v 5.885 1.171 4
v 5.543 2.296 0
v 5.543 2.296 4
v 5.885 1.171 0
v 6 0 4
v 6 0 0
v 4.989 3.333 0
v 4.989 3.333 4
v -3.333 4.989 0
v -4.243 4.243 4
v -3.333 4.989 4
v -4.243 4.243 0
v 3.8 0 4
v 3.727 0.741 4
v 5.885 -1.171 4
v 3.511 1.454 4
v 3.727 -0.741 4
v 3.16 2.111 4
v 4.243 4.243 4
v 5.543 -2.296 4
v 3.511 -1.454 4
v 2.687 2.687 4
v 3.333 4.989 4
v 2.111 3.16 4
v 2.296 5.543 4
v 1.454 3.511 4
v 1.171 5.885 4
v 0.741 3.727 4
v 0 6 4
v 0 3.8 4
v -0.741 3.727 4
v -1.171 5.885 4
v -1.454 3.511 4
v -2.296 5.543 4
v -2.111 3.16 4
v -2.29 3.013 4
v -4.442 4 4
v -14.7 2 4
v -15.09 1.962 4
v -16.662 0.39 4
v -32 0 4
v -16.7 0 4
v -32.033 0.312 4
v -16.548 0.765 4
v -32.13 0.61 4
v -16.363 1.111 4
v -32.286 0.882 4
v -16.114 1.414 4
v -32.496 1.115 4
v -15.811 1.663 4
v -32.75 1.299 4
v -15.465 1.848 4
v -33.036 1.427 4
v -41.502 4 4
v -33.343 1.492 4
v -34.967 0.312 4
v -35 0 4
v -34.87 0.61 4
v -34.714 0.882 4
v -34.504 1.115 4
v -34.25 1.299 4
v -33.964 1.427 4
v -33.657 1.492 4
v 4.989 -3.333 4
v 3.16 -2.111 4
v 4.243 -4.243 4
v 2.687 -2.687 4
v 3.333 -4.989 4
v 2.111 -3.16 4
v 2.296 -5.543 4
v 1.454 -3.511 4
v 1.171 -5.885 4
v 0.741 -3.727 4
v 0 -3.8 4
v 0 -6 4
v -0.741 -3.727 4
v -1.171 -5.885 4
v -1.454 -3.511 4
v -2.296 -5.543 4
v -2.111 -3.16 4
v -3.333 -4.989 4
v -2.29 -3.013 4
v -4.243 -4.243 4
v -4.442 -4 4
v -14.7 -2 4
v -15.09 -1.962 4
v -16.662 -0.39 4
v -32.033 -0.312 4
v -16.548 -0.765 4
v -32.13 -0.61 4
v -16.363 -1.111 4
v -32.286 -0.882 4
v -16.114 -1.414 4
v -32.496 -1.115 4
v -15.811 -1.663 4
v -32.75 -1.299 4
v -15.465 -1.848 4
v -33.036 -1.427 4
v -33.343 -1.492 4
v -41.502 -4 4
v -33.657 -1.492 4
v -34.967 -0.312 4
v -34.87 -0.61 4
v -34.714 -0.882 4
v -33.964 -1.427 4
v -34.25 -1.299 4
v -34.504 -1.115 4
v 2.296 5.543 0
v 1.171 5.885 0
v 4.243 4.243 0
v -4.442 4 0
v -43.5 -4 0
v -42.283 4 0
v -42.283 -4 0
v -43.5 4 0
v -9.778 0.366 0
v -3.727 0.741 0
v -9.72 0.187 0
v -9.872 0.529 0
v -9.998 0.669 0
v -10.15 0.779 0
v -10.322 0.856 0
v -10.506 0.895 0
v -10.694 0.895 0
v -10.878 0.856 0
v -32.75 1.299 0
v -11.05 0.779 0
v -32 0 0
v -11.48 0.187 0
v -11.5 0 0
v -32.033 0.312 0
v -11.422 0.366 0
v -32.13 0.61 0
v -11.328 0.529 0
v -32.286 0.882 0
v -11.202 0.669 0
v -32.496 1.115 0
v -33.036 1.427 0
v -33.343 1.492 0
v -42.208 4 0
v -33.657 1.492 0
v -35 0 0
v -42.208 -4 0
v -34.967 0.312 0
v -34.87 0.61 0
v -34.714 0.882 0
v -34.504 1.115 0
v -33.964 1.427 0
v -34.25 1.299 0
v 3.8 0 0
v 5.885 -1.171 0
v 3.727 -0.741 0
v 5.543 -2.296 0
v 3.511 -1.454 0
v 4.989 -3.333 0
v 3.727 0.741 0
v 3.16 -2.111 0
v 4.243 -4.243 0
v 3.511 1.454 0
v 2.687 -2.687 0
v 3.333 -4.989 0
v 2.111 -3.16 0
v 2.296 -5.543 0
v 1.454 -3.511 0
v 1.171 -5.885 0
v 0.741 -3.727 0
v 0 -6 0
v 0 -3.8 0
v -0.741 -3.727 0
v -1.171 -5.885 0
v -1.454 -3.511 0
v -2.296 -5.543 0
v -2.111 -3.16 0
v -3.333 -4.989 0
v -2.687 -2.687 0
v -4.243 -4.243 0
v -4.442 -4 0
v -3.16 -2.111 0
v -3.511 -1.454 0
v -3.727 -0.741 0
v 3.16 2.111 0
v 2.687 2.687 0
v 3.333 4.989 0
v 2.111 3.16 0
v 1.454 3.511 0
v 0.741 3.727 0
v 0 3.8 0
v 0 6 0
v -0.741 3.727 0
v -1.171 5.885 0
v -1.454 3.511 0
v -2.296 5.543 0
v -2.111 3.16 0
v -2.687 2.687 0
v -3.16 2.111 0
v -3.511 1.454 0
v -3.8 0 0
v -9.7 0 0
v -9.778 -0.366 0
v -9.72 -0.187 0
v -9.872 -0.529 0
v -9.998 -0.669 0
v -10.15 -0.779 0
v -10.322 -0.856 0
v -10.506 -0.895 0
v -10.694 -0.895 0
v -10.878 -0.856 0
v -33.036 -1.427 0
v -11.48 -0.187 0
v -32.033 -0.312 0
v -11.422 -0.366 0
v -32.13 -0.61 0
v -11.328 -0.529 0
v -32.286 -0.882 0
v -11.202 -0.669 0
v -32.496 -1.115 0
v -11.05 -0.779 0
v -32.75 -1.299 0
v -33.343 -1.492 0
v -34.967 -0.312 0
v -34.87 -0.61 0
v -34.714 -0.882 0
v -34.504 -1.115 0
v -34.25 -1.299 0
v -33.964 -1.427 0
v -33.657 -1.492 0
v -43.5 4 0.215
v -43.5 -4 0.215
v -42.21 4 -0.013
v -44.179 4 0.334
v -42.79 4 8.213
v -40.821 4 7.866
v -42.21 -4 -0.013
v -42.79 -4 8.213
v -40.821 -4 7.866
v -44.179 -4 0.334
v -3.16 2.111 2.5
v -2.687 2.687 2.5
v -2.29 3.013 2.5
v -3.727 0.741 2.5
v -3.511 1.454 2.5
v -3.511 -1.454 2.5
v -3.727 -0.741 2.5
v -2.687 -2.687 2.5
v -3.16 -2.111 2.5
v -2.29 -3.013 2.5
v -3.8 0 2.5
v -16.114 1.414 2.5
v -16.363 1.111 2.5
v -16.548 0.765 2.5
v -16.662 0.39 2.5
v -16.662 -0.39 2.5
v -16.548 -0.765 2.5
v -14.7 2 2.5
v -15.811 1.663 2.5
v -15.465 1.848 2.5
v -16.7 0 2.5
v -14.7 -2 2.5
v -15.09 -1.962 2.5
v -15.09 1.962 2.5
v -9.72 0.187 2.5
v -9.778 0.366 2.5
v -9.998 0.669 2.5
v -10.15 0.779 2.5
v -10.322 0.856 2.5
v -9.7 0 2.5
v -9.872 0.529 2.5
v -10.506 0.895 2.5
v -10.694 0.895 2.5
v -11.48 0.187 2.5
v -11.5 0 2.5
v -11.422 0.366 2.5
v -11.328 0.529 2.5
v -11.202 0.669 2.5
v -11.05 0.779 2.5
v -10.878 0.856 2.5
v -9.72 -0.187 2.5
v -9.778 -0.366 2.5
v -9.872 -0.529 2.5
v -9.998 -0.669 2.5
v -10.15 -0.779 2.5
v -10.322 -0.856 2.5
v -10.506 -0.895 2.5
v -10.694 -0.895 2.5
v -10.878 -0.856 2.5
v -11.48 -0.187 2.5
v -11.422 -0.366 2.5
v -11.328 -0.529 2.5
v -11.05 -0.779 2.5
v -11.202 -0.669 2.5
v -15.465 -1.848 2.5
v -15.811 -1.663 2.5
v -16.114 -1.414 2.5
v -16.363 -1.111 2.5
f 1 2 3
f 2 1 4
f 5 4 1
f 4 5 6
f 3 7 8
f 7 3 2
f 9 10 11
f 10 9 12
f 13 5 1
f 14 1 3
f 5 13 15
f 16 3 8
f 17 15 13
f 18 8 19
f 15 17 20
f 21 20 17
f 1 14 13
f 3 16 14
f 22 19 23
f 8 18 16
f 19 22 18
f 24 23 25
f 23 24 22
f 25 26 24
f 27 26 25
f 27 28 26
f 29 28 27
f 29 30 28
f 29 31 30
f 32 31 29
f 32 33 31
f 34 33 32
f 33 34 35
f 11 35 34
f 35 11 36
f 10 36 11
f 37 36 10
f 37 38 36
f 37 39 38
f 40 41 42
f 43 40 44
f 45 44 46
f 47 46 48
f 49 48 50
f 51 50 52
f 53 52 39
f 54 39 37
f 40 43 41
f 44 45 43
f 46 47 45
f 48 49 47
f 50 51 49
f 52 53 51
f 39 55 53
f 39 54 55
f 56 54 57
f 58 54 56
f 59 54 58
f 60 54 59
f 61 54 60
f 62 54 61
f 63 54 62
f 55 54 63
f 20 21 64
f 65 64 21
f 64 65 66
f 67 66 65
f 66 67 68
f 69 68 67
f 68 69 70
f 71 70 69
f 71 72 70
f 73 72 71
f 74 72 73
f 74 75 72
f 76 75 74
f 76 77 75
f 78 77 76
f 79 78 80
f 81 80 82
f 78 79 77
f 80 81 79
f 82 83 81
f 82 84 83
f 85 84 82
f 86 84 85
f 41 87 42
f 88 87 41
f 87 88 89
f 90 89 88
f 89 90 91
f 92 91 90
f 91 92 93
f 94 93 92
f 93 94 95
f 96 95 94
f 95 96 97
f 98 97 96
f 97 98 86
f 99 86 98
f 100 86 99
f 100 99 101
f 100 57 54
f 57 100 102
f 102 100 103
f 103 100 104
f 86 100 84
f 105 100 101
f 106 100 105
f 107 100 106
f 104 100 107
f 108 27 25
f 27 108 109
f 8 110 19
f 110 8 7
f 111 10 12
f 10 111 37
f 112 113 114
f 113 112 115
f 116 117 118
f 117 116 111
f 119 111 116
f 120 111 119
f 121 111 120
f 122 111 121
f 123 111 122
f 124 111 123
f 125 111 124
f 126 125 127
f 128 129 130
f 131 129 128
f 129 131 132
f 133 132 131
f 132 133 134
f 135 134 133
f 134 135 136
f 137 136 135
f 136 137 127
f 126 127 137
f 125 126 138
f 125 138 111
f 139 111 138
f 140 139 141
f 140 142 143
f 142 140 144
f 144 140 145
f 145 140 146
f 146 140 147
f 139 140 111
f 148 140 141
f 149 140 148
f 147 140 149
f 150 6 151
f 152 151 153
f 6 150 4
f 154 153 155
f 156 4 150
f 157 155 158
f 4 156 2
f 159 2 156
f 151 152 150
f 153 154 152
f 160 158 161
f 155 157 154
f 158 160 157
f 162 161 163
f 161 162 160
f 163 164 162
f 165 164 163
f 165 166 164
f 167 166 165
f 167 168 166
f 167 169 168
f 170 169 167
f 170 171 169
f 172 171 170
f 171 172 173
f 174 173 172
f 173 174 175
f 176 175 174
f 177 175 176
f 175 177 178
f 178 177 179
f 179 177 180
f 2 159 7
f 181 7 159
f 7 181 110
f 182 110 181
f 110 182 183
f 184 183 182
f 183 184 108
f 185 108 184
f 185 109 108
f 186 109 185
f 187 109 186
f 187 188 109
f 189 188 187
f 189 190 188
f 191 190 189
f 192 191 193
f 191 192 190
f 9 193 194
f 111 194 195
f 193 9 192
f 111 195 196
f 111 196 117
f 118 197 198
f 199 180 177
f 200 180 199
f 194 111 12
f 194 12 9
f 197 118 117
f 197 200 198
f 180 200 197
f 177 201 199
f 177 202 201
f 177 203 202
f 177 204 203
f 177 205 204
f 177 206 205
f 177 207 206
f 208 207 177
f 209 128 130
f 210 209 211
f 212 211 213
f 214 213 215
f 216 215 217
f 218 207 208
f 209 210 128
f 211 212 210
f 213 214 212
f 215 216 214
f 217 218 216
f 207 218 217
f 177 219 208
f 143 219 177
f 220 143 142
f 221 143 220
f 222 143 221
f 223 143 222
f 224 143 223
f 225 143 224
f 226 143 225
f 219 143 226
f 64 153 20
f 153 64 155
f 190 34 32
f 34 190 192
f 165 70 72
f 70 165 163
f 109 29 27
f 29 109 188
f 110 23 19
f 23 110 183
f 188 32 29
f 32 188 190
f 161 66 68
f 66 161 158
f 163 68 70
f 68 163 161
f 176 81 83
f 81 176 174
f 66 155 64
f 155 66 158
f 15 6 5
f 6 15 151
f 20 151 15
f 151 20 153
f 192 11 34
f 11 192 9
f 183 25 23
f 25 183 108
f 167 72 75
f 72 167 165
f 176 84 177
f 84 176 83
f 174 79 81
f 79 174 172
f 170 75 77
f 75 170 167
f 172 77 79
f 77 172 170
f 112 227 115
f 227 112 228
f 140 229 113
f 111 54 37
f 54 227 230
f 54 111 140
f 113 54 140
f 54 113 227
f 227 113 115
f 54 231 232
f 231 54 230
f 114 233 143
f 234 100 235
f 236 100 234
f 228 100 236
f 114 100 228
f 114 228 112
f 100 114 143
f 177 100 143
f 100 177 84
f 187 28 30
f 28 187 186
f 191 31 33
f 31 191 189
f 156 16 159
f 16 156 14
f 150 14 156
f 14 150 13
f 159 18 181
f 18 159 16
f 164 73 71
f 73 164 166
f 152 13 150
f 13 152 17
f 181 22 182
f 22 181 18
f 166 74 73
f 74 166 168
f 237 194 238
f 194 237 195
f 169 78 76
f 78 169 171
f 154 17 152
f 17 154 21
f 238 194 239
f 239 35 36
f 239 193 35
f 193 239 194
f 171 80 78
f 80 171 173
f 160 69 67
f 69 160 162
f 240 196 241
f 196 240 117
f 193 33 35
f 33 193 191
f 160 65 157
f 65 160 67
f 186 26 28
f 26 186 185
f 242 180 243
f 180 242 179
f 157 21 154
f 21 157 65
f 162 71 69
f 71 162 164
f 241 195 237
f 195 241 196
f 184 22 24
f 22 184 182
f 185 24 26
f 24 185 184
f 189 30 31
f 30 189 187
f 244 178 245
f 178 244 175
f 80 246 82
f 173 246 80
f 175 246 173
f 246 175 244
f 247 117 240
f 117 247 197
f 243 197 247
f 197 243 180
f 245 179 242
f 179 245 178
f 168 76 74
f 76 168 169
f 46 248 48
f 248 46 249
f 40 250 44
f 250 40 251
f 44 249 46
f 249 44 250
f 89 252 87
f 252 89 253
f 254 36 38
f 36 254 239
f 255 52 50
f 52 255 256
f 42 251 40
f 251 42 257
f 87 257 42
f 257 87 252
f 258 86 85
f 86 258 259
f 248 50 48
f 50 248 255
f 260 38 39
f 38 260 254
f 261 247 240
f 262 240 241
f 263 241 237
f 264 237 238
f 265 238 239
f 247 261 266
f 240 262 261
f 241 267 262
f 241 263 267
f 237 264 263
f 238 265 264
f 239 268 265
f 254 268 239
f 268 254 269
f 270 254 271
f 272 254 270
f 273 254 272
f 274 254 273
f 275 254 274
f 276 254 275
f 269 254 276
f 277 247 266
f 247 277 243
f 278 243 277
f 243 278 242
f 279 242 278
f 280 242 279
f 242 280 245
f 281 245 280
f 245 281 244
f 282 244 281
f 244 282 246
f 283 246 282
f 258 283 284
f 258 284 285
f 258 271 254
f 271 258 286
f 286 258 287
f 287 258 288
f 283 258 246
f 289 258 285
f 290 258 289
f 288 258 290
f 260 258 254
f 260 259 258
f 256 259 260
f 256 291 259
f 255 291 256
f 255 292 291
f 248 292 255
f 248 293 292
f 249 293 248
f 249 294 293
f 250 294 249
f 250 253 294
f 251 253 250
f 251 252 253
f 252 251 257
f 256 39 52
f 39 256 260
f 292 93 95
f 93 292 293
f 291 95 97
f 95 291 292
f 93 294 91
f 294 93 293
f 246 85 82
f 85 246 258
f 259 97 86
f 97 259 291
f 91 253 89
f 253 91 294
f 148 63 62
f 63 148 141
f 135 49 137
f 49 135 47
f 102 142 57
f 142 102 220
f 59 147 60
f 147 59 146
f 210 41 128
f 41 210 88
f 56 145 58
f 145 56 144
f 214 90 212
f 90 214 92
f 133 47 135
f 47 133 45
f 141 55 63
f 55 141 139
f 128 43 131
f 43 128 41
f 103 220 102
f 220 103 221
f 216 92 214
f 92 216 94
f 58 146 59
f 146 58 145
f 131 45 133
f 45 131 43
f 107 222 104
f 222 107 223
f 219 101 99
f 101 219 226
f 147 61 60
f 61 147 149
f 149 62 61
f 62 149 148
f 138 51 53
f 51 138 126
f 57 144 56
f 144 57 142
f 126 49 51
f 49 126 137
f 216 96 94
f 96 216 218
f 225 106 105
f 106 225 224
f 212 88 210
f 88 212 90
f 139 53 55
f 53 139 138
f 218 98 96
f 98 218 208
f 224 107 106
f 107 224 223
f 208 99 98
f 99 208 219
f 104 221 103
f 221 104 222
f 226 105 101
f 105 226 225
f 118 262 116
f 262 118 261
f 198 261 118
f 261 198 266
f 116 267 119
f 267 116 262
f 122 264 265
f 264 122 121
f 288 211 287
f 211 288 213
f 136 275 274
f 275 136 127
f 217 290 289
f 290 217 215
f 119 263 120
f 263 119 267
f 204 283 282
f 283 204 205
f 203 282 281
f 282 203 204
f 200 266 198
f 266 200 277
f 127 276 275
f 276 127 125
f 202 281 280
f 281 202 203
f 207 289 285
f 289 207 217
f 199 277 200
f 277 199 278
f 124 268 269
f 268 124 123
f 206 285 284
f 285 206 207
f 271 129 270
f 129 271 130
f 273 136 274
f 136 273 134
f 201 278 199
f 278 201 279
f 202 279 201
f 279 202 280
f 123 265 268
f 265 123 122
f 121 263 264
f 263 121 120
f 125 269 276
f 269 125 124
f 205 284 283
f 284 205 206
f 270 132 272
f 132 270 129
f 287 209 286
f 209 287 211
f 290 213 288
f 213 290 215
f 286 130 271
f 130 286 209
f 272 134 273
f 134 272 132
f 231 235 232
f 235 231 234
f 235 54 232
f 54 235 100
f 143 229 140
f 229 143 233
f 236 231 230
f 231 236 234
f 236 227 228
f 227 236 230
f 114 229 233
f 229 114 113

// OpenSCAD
//-- limit switch holder / servo arm extender for Auto Bed Leveling
//-- by AndrewBCN - Barcelona, Spain - November 2014
//-- GPLV3
//-- (armv3 below)

//-- remix of Thingiverse #167430 (armv1 below)
//-- by zennmaster

//-- remix of Thingiverse #209384 (armv2 below)
//-- by Stephen Castello

// Some measurements and features

// armv1 has a (fixed) length of 37mm,
// width is 10mm, thickness is 4mm,
// uses 2 x M2.5 screws and nuts to hold a small limit switch.
// Uses standard 9G microservo.

// armv2 is for a much larger limit switch and also
// apparently for a larger servo, although everything seems
// to be configurable. Default thickness is 5mm.
// Uses M3 screws and nuts to hold the limit switch.

// armv3 has a parametric length (default is 37mm), uses
// a T-profile with 4mm base thickness to avoid flexing,
// holds the small limit switch with either 2 x small M2.5
// screws and nuts or a nylon tie.
// Uses standard 9G microservo.
// The slot for the servo arm is properly shaped.


// arm body length, add approximately 8mm for total length
// i.e. with an arm length of 37mm, the distance between
// the servo center and the tip of the limit switch is 45mm

// Configure according to your extruder dimensions


x = 2;
gX = 15; gY = 20; gZ = 2;
gXoff = -2.5;
bX = 10; bY = 15; bZ = 3+3;
bYY = 12.6;

rX = 12;rY=1.1;rZ=1.5;

arm_length=43.5; // [30:70]


translate([0,0,gZ])
{
   difference(){
   armv3();

    translate([-33.5,0,-5])
        cylinder(d=3,h=20,$fn=30);
     
    translate([-10.6,0,-5])
        cylinder(d=1.8,h=20,$fn=30);
     
   }
   translate([-arm_length+1,0,2.1])
   rotate([0,10,0]) cube([2,8,8],true);
 }
/*
difference() {
color("orange")
translate([gXoff*3/2,0,1])
cube([gX+4,gY+4,gZ+4]);

color ("blue") 
translate([0,4.5,0])
cube([bX+ .2,bY+.2,bZ +.2]);
    
translate([gXoff+.1,0,2])
color ("green") cube([gX+.1,gY+.1,gZ+.1]);
}

*/
//translate([gXoff,0,2])
//color ("green") cube([gX,gY,gZ]);



//translate([0,0,bZ])
//mirror([0,0,1])

module sliderMain() {

difference() {
  union() {
  //mirror([0,0,1]) 
    //translate([arm_length,(bY+5)/2,-8])  armv3();
  
    //main body
   color ("blue") 
       translate([0,(gY-bY)/2,0])
       cube([bX,bY,bZ]);
   
    translate([0,10,3.9]) {
   rotate([135,0,0])  translate([0,1.15,-1.15]) cube([bX,5.5,5]);
        
   rotate([318,0,0])  translate([0,-1.40,+1.40]) cube([bX,5.5,5]);
      
   translate([0,(-8)/2,0])
      cube([bX,8,7]);
    }
    
  }
    /* color("pink") translate([20,(bY+5)/2,.25]) hull() {
       
      translate([0,0,5.5]) cylinder(r=3.2,h=.5,center=true,$fn=32);
      translate([-14.7,0,5.5]) cylinder(r=2,h=.5,center=true,$fn=32);
    }
    */
  
    color ("red") {
    //center slot
    translate([-rY,(gY-rY*2)/2,0])
        cube ([rX,rY*2,rZ]);

    //left slot
    translate([-1,(gY-bYY-rY)/2+1.2,0]) 
        rotate([0,0,-5])
        cube ([rX,rY,rZ]);
    //right slot
    translate([-1,(gY+bYY+rY)/2-1.2-rY,0]) 
        rotate([0,0,5]) 
        cube ([rX,rY,rZ]);
    }
    //bottom clearance
    translate([0,(gY-11.2)/2,0]) 
        cube([bX,11.2,.75]); 
    
    /* 
    //slot hole  
    translate([0,(gY-5)/2,2.6]) 
       cube([bX,5.5,2 ]);
    */  
    
    translate([gY/4,gY/2,-5])
        cylinder(d=3,h=20,$fn=30);
    
    //translate([arm_length-10,gY/2,0])
    //    cylinder(d=2,h=10,$fn=30);
}


/*
//slot hole supports
translate([0,(gY-.2)/2+2,2.6]) 
cube([bX,.2,2]);

translate([0,(gY-.2)/2-2,2.6]) 
cube([bX,.2,2]);
*/
}
//translate([bX,(gY-12.6)/2,0]) cube([1,12.6,1]);
//translate([0,(gY-11.5)/2,0]) cube([1,11.5,1]);



module armv3() {
  //  rotate([180,0,0]) 
  difference() {
      // body
      union() {
      cylinder(r=6, h=4,center=true,$fn=32);
      translate([-arm_length/2,0,0]) cube([arm_length,8,4],center=true);


      }
      
    // hole for servo spindle
    cylinder(r=3.8,h=10,center=true,$fn=32); 

    // slot for servo arm
    hull() {
      translate([0,0,5.5]) cylinder(r=3.2,h=10,center=true,$fn=32);
      translate([-14.7,0,5.5]) cylinder(r=2,h=10,center=true,$fn=32);
    }
 
    }

   //rotate([135,0,0])  translate([-arm_length,1.15,-1.15]) cube([bX,5.5,5]);
        
   // rotate([318,0,0])  translate([-arm_length,-1.40,+1.40]) cube([bX,5.5,5]);
}
